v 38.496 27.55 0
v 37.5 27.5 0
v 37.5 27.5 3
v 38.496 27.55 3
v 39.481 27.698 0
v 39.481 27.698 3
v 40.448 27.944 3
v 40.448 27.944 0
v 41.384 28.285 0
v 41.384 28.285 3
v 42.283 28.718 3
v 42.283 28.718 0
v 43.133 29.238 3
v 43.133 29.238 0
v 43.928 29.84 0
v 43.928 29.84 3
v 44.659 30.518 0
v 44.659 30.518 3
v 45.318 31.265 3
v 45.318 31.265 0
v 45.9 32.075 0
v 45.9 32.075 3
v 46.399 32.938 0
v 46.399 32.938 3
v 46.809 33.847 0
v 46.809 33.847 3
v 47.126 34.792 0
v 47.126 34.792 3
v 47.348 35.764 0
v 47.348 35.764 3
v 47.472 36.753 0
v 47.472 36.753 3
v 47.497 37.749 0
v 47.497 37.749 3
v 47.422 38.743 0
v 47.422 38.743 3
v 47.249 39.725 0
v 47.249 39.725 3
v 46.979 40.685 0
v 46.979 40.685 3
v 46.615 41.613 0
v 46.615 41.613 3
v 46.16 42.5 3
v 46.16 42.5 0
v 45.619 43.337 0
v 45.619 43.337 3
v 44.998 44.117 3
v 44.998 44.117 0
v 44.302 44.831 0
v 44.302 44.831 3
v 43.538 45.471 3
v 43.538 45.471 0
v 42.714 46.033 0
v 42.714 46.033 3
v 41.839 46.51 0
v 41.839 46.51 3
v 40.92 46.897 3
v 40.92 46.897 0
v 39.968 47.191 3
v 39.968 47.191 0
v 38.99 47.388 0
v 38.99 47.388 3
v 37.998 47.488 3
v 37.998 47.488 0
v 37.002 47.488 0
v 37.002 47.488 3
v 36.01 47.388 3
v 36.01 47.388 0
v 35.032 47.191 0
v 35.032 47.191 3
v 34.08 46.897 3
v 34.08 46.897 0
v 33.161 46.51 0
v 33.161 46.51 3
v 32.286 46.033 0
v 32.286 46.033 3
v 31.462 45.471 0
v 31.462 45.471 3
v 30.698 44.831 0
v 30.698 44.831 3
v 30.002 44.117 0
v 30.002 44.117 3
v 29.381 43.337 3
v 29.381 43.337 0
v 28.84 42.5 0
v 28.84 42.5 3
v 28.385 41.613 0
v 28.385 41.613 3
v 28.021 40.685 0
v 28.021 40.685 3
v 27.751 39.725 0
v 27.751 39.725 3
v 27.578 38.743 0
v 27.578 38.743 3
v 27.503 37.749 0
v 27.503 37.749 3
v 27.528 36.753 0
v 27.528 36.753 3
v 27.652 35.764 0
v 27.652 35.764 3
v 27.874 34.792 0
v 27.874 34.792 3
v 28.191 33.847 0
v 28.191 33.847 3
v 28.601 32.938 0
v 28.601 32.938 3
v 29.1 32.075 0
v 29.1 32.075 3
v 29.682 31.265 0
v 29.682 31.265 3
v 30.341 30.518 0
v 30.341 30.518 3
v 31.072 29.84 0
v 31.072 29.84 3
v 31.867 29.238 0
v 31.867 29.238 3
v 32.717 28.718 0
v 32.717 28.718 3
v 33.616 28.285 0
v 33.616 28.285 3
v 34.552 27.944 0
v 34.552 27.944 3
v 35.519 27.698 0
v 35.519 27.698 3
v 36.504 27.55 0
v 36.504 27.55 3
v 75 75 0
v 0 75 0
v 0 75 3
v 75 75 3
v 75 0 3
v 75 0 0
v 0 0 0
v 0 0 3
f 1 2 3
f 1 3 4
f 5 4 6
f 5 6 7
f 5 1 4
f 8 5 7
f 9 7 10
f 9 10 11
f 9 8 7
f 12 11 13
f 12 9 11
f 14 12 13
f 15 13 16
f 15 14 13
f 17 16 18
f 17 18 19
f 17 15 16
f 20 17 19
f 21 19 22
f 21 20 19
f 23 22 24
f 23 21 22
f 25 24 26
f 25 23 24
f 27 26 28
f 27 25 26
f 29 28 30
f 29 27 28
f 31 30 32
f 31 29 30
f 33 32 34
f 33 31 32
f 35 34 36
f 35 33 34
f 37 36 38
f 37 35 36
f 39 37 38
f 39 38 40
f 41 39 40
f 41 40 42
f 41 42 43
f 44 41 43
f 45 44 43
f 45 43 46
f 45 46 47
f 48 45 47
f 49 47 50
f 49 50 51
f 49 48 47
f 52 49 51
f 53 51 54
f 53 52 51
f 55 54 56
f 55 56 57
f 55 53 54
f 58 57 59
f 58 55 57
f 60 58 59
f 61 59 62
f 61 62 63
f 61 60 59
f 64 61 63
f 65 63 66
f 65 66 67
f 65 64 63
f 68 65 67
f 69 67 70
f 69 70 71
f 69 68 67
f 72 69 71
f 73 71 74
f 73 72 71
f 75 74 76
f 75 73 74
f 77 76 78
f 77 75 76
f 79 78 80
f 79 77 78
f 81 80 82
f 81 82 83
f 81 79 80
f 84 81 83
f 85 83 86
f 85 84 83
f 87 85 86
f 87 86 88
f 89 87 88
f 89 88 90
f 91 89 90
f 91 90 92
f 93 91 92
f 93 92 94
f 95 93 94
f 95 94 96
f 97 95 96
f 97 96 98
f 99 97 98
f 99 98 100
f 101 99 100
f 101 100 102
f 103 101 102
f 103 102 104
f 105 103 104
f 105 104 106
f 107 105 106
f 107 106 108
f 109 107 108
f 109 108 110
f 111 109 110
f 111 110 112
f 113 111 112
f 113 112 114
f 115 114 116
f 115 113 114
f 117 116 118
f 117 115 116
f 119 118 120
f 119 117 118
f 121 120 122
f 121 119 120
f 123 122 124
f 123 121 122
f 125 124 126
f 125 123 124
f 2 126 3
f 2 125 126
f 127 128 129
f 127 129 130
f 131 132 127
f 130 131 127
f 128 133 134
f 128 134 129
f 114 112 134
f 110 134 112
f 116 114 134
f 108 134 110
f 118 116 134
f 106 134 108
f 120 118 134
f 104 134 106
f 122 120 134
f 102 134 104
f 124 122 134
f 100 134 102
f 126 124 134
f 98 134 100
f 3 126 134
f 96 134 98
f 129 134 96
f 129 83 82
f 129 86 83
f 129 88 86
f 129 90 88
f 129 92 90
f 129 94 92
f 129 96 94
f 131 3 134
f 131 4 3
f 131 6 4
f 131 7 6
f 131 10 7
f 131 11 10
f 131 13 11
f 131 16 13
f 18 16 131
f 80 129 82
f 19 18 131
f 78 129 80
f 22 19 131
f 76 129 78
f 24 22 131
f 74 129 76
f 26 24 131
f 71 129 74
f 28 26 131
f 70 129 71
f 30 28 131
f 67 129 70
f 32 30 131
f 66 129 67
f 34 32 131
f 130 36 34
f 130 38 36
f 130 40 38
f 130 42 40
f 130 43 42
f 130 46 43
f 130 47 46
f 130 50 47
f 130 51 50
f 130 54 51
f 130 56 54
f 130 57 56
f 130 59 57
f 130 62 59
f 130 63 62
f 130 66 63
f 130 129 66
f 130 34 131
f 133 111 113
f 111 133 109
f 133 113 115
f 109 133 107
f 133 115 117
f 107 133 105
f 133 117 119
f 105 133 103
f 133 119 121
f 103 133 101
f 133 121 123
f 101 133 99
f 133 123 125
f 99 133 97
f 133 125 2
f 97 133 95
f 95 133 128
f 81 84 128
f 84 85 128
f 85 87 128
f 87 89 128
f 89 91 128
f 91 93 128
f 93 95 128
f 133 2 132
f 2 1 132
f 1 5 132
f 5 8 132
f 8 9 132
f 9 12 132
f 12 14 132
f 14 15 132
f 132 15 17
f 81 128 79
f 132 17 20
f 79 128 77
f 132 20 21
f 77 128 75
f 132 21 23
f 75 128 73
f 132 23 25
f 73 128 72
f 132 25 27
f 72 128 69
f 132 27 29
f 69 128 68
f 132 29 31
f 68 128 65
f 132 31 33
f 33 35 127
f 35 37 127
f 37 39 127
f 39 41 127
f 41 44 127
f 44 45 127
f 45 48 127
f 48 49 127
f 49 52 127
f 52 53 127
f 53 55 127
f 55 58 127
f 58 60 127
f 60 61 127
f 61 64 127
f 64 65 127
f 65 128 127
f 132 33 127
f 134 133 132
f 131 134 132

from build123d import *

# Parameters (mm, degrees)
BOX_W          = 75
BOX_H          = 75
BOX_DEPTH      = 3
CYLINDER_R     = 10
CYLINDER_DEPTH = 3


with BuildPart() as part:
    # Box → Box (join)
    with BuildSketch(Plane.XY):
        with Locations((37.5, 37.5)):
            Rectangle(BOX_W, BOX_H)
    extrude(amount=BOX_DEPTH)

    # Cylinder → Cylinder (cut)
    with BuildSketch(Plane(origin=(37.5, 37.5, 0), x_dir=(0, -1, 0), z_dir=(0, 0, 1))):
        Circle(CYLINDER_R)
    extrude(amount=CYLINDER_DEPTH, mode=Mode.SUBTRACT)


solid = part.part
